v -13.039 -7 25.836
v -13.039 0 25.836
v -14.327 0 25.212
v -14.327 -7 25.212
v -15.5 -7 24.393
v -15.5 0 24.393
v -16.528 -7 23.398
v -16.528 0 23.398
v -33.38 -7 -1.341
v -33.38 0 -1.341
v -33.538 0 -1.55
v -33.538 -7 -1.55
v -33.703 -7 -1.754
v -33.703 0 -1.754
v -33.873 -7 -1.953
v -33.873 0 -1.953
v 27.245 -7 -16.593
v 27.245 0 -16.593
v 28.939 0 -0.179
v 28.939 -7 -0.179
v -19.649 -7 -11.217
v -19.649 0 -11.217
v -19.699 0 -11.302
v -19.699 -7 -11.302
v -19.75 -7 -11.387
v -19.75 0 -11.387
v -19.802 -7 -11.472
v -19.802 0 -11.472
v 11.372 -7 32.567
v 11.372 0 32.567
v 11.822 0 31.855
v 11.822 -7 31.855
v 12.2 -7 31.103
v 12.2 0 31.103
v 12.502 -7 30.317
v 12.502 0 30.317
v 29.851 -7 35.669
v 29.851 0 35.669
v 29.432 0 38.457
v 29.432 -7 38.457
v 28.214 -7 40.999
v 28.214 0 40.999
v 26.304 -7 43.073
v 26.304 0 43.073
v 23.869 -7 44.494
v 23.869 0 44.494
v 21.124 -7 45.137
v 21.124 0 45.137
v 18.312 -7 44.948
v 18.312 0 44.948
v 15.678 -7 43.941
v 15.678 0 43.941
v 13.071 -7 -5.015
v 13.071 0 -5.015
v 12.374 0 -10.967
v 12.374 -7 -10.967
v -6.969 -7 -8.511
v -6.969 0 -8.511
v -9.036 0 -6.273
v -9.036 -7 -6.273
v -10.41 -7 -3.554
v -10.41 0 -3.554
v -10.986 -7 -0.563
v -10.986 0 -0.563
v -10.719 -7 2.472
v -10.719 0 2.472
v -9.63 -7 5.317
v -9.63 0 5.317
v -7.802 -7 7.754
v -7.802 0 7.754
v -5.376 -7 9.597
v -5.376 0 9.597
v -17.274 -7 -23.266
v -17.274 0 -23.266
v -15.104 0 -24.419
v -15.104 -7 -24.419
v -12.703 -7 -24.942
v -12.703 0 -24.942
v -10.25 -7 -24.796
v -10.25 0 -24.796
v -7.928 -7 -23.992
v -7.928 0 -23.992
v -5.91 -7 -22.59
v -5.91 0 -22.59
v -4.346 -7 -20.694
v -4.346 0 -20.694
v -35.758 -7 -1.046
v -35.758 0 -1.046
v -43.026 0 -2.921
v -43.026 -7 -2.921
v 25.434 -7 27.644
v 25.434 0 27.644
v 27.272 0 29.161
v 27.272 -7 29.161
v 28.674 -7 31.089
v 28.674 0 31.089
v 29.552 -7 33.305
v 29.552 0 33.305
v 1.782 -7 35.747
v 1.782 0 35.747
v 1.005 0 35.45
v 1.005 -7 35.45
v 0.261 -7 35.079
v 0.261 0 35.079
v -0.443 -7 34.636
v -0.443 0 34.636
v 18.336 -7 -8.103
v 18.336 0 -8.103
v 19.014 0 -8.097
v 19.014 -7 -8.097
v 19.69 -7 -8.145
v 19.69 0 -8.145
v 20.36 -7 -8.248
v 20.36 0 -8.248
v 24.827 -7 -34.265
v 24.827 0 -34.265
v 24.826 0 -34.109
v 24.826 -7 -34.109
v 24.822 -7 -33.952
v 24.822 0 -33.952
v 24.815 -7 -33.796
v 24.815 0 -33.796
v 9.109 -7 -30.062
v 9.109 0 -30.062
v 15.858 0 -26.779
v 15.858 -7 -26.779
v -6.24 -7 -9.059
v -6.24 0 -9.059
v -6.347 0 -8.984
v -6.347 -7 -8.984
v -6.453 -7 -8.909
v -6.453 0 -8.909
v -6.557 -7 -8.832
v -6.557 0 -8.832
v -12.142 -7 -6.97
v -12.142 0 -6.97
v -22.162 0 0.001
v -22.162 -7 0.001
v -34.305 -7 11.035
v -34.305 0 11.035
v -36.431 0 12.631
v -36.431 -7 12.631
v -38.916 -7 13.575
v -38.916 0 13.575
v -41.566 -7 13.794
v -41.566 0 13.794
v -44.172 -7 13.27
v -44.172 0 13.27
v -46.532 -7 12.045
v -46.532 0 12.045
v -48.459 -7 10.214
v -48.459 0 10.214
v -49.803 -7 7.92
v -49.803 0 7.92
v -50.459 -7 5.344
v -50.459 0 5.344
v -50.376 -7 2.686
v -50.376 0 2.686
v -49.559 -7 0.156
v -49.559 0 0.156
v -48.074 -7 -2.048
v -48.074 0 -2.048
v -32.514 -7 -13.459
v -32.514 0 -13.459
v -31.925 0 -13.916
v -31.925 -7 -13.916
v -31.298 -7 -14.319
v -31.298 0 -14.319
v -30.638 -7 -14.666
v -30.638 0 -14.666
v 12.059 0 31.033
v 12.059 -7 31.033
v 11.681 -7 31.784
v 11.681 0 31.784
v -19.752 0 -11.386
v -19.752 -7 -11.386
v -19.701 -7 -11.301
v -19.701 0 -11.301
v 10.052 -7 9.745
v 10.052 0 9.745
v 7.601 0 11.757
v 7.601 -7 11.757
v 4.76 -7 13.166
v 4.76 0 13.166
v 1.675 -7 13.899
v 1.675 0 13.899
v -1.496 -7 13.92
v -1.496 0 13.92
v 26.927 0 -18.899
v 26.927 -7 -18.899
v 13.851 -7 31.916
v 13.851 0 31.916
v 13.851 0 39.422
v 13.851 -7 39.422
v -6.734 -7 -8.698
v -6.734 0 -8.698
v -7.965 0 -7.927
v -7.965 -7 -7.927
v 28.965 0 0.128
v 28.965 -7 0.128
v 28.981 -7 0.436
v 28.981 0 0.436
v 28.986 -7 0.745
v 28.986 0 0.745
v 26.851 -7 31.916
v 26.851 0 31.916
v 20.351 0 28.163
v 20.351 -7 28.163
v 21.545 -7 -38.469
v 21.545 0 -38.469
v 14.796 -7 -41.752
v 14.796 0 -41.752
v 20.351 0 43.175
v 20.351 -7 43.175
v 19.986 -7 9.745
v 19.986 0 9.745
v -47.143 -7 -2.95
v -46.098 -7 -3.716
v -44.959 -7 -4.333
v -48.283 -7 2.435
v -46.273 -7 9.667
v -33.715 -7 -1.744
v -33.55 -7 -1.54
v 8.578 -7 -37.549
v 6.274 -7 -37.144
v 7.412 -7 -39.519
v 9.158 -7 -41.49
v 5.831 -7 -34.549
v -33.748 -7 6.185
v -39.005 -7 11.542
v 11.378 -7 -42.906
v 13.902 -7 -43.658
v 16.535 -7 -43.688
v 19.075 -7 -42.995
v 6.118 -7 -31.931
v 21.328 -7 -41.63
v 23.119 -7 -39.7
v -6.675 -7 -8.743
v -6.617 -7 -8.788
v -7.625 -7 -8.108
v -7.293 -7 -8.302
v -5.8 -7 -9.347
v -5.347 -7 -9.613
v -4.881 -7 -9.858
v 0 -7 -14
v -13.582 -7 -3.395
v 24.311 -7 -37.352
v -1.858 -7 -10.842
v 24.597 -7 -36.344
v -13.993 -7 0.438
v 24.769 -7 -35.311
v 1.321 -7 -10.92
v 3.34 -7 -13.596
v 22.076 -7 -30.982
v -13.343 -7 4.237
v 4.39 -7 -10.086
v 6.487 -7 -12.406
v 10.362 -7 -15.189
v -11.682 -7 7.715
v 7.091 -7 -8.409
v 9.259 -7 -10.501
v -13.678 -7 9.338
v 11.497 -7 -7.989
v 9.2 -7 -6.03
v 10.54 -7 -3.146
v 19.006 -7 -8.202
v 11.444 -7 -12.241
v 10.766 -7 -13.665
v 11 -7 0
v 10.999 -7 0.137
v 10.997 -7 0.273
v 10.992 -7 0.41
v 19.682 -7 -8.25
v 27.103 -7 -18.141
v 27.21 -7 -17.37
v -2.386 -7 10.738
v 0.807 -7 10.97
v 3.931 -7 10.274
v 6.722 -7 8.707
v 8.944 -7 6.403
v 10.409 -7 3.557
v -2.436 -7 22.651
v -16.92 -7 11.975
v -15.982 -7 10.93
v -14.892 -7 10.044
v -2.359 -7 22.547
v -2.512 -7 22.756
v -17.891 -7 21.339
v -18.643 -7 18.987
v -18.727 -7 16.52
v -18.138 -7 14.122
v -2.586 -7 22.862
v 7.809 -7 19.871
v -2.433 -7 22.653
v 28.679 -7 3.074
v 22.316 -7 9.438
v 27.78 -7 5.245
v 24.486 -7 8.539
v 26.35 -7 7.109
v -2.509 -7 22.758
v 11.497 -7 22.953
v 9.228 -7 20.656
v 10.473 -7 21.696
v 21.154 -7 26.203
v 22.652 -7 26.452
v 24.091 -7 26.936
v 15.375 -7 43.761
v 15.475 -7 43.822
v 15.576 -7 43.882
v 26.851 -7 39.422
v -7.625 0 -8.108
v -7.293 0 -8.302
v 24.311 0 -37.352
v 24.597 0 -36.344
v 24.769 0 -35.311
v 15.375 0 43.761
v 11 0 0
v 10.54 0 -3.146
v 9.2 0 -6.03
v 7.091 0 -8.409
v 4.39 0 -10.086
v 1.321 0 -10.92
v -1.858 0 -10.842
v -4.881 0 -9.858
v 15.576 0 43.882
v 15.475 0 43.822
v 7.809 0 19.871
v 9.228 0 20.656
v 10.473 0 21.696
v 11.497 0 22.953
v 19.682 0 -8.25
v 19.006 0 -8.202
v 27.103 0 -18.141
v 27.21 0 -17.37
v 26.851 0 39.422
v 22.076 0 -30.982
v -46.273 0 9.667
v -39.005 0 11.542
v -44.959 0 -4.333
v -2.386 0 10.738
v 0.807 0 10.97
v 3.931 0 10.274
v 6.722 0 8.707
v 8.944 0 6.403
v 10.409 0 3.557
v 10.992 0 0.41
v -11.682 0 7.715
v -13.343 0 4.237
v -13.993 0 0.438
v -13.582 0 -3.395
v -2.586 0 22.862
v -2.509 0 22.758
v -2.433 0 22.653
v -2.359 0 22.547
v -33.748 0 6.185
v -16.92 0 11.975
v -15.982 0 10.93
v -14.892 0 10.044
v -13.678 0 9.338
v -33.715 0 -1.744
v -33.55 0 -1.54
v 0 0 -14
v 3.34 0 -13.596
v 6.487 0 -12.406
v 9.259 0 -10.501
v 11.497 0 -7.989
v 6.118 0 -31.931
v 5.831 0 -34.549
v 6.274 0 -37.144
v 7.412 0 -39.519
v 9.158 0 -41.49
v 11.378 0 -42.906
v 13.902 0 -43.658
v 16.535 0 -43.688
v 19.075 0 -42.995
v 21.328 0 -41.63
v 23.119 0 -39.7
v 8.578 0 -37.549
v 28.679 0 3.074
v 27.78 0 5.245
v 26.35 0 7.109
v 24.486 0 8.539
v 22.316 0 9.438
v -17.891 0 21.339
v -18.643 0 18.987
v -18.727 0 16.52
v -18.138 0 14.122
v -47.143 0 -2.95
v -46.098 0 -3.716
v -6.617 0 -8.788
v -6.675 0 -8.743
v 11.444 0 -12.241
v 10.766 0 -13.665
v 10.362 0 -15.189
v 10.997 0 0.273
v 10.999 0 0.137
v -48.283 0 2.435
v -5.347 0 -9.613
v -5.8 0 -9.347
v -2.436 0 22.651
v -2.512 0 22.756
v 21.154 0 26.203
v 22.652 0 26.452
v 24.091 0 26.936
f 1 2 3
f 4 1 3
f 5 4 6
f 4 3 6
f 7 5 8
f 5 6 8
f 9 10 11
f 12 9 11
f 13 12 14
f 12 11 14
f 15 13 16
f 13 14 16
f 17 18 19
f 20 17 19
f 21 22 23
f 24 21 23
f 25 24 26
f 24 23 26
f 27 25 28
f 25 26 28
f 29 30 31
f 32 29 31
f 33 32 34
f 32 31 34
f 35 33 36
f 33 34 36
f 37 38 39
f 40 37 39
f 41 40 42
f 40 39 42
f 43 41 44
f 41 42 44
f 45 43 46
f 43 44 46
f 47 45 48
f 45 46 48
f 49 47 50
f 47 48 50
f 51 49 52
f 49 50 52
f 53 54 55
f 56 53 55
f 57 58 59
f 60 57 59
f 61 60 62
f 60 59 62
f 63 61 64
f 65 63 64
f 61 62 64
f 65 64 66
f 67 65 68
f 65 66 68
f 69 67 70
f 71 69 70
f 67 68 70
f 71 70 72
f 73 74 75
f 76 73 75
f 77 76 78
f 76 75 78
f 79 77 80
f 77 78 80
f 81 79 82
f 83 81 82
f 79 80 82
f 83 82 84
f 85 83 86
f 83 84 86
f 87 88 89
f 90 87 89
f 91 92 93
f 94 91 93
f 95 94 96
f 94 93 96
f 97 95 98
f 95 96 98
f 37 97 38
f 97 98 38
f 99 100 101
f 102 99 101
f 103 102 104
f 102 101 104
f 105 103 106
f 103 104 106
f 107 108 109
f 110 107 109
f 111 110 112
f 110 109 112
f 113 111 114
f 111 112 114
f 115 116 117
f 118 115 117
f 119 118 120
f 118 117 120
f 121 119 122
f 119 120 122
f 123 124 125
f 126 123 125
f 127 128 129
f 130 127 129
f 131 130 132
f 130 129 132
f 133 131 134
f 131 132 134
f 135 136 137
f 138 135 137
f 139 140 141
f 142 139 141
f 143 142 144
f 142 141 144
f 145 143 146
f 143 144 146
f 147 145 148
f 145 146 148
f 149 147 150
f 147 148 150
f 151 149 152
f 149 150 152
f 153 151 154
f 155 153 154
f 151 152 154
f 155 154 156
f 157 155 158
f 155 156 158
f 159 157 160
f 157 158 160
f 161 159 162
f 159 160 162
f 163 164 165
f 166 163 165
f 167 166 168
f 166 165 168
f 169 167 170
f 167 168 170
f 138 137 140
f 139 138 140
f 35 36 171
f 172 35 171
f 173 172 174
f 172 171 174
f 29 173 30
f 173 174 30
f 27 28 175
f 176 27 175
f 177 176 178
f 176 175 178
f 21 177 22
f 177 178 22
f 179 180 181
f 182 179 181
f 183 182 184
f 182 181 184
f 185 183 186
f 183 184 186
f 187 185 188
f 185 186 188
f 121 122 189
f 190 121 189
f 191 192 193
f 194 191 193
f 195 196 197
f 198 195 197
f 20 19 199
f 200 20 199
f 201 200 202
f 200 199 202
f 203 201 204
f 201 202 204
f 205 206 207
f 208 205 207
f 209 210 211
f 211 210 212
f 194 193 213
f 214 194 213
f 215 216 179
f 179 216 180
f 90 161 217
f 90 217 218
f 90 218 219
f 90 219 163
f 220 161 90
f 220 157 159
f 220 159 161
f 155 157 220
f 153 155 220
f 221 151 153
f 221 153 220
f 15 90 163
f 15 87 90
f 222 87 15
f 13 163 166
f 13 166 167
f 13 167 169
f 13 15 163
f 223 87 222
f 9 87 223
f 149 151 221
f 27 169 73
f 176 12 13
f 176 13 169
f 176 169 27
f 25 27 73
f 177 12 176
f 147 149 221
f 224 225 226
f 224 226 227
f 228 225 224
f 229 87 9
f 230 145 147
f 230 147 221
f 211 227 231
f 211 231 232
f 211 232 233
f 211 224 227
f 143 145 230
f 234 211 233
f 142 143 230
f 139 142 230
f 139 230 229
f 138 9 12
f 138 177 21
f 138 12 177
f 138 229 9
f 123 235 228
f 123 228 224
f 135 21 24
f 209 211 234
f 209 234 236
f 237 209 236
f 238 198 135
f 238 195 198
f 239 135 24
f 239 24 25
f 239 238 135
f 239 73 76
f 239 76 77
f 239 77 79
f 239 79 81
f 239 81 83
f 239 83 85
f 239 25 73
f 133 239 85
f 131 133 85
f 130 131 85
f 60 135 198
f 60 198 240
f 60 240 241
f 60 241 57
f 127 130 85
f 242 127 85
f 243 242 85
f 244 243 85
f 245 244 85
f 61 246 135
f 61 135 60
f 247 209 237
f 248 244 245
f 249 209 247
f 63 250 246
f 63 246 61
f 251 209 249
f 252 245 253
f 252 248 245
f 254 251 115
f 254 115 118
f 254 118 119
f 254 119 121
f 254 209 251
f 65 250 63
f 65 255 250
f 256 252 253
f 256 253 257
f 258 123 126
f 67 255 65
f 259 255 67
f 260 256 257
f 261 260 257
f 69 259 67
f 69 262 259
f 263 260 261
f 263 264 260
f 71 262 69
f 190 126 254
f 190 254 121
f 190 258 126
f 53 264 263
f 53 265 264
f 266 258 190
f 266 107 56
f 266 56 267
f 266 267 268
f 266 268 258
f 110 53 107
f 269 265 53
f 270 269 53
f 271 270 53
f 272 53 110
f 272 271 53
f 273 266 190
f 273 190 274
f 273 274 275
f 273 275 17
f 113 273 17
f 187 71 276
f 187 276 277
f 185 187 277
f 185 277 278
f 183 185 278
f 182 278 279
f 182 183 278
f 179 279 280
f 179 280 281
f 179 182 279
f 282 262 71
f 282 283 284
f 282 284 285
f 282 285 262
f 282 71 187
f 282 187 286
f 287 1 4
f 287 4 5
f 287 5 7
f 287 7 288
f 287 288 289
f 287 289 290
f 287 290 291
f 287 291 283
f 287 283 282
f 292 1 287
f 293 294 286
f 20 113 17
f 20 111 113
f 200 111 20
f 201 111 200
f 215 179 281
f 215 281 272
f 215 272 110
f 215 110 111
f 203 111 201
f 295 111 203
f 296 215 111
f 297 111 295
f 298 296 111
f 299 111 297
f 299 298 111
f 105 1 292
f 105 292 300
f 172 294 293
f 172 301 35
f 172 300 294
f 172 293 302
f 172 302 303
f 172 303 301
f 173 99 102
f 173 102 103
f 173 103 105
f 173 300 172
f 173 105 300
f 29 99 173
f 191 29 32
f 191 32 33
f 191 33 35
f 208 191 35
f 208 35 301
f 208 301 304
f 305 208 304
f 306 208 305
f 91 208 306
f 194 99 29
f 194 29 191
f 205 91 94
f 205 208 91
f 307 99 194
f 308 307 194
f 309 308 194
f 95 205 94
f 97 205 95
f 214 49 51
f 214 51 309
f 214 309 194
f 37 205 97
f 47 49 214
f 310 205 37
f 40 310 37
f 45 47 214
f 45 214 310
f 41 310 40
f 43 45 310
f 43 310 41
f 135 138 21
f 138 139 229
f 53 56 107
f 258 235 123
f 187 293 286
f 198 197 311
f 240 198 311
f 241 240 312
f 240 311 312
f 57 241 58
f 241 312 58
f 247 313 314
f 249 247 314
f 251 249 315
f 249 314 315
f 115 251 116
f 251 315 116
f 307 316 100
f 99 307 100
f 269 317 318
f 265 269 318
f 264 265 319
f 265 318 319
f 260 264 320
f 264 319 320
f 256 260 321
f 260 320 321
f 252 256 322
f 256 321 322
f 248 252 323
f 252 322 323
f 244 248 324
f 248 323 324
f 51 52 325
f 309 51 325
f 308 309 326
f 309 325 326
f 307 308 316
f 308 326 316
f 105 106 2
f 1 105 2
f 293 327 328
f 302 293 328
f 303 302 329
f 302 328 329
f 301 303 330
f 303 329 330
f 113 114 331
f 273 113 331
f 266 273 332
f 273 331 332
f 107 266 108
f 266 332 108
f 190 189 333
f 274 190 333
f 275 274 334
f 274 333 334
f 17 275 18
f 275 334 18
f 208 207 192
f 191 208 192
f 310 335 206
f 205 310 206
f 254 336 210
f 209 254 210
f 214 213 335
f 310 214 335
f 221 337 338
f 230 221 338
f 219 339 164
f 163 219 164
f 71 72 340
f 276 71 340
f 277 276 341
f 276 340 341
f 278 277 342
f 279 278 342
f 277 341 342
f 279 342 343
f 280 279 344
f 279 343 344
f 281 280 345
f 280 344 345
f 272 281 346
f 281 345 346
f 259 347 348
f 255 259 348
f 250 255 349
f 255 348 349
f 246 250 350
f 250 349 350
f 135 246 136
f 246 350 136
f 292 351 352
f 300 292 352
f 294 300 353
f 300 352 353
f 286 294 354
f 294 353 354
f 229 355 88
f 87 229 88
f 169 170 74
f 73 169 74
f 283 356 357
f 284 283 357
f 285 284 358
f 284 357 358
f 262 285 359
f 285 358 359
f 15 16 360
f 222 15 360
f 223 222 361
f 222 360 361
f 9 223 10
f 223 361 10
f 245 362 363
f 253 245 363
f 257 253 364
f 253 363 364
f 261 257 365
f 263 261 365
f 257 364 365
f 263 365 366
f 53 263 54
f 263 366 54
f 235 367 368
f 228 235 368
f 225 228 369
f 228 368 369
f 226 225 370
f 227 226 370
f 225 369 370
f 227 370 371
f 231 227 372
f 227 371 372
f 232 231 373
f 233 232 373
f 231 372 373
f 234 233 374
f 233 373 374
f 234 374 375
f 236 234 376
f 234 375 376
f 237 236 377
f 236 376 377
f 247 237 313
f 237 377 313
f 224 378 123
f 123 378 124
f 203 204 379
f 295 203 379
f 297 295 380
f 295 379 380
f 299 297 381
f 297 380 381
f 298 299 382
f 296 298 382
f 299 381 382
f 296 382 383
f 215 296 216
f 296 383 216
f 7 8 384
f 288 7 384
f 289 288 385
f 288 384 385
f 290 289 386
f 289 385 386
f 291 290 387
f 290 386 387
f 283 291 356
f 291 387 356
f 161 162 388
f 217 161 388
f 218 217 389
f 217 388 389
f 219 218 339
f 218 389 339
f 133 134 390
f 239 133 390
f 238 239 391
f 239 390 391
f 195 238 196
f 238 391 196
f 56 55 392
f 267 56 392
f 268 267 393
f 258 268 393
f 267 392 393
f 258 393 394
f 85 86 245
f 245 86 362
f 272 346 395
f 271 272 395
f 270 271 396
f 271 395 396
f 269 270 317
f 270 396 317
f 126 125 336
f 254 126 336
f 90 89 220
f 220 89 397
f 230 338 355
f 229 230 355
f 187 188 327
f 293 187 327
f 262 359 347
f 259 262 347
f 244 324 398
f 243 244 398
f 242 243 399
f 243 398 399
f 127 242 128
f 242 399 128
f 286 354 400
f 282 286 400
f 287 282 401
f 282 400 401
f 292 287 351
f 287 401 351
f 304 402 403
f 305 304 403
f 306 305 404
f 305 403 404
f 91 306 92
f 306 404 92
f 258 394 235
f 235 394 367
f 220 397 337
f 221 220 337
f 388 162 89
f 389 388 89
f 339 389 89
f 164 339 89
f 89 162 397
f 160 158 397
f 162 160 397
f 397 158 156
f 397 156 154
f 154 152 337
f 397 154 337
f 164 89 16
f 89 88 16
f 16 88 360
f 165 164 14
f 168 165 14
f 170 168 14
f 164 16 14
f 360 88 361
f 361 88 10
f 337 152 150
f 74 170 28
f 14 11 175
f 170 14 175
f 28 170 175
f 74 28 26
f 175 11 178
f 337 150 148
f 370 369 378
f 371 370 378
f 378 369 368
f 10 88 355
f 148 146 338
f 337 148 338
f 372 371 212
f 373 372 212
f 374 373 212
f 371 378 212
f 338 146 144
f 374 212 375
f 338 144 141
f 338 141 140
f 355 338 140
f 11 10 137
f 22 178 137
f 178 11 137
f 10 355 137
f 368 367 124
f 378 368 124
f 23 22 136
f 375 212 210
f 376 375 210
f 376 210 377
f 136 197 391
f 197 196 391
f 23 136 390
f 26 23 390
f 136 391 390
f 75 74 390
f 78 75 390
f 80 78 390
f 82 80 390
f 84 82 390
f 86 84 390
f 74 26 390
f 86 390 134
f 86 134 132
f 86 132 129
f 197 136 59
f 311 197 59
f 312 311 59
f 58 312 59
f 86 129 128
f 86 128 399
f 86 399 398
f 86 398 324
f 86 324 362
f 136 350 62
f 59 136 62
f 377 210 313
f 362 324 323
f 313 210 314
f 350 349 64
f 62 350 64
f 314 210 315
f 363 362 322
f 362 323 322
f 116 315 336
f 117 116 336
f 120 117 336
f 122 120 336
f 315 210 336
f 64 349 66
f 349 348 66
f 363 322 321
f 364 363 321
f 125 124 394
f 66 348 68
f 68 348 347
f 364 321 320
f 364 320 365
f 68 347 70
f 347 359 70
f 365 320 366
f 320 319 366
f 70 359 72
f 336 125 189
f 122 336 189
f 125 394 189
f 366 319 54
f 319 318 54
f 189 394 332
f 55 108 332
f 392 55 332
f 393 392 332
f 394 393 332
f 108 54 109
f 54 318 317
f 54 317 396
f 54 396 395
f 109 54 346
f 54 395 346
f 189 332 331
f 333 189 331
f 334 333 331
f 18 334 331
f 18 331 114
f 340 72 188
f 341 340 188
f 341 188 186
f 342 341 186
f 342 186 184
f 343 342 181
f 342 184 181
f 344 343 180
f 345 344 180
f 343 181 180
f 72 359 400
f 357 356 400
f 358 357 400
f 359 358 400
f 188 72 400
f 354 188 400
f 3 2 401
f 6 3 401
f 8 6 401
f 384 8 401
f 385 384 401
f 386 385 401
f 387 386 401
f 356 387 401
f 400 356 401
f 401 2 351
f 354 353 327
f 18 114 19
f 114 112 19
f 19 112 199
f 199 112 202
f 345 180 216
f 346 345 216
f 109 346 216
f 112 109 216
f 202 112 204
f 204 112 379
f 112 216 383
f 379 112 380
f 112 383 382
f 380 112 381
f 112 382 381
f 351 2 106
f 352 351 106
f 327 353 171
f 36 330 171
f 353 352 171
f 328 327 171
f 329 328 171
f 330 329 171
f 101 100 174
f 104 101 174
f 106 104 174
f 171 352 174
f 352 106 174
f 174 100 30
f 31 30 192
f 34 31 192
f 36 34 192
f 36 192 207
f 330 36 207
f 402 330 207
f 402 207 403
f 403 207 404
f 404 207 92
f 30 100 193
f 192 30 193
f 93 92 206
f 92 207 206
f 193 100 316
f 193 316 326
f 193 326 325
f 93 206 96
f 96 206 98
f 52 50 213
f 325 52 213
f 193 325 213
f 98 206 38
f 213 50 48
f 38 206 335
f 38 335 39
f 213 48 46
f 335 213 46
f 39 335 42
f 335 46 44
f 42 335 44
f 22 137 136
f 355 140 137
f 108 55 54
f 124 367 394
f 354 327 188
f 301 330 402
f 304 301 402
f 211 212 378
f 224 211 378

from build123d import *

# Parameters (mm, degrees)
F1_DEPTH = 7


with BuildPart() as f1:
    # F0 (on Front) → F1 (new body)
    with BuildSketch(Plane.XZ):
        with BuildLine():
            ThreePointArc((11, 0), (5.8012105465, -9.3459058521), (-4.8810829447, -9.8577395628))
            ThreePointArc((-4.8810829447, -9.8577395628), (-5.5749329735, -9.4826221237), (-6.2401185881, -9.0587482582))
            ThreePointArc((-6.2401185881, -9.0587482582), (-4.4334688175, -11.105495634), (-3.3236127951, -13.5997646299))
            ThreePointArc((-3.3236127951, -13.5997646299), (-1.6738122926, -13.8995810156), (0, -14))
            ThreePointArc((0, -14), (7.9304668623, -11.5372308352), (13.0708038317, -5.0153850494))
            ThreePointArc((13.0708038317, -5.0153850494), (11.5818296218, -2.4752215759), (10.9923725134, 0.4095687088))
            ThreePointArc((10.9923725134, 0.4095687088), (10.998092963, 0.2048198634), (11, 0))
        make_face()
        with BuildLine():
            ThreePointArc((-5.376474925, 9.5965367389), (5.3837414339, 9.5924620496), (10.9923725134, 0.4095687088))
            ThreePointArc((10.9923725134, 0.4095687088), (11.3655224252, 3.3302251077), (12.6613409157, 5.9741481582))
            ThreePointArc((12.6613409157, 5.9741481582), (11.5120561281, 7.9669670329), (10.0519351006, 9.7446703758))
            ThreePointArc((10.0519351006, 9.7446703758), (4.7602009643, 13.1658834409), (-1.4958903607, 13.9198531612))
            ThreePointArc((-1.4958903607, 13.9198531612), (-3.0777558878, 11.4364731057), (-5.376474925, 9.5965367389))
        make_face()
        with BuildLine():
            ThreePointArc((12.6613409157, 5.9741481582), (11.3655224252, 3.3302251077), (10.9923725134, 0.4095687088))
            ThreePointArc((10.9923725134, 0.4095687088), (11.5818296218, -2.4752215759), (13.0708038317, -5.0153850494))
            ThreePointArc((13.0708038317, -5.0153850494), (13.765741056, -2.5503672634), (14, 0))
            ThreePointArc((14, 0), (13.6612366355, 3.0611457969), (12.6613409157, 5.9741481582))
        make_face()
        with BuildLine():
            Line((-8.3457962775, -11.2404485895), (-6.5574113609, -8.8317810346))
            ThreePointArc((-6.5574113609, -8.8317810346), (-6.6459743499, -8.7653308517), (-6.7338640067, -8.6979926155))
            Line((-6.7338640067, -8.6979926155), (-7.9648038145, -7.9274867454))
            ThreePointArc((-7.9648038145, -7.9274867454), (-9.9953714425, -7.1966013967), (-12.1415555616, -6.9701239979))
            ThreePointArc((-12.1415555616, -6.9701239979), (-10.4638336366, -9.3009776704), (-8.3457962775, -11.2404485895))
        make_face()
        with BuildLine():
            ThreePointArc((-3.0061369382, -15.9691051511), (-3.0858589916, -14.7738472893), (-3.3236127951, -13.5997646299))
            ThreePointArc((-3.3236127951, -13.5997646299), (-5.95276155, -12.6714099424), (-8.3457962775, -11.2404485895))
            Line((-8.3457962775, -11.2404485895), (-17.2744989499, -23.2659785715))
            ThreePointArc((-17.2744989499, -23.2659785715), (-10.2503324106, -24.7961743397), (-4.3464215016, -20.6944368252))
            ThreePointArc((-4.3464215016, -20.6944368252), (-3.3476890712, -18.424971706), (-3.0061369382, -15.9691051511))
        make_face()
        with BuildLine():
            ThreePointArc((0, -14), (-1.6738122926, -13.8995810156), (-3.3236127951, -13.5997646299))
            ThreePointArc((-3.3236127951, -13.5997646299), (-3.0858589916, -14.7738472893), (-3.0061369382, -15.9691051511))
            ThreePointArc((-3.0061369382, -15.9691051511), (-3.3476890712, -18.424971706), (-4.3464215016, -20.6944368252))
            Line((-4.3464215016, -20.6944368252), (0, -14))
        make_face()
        with BuildLine():
            ThreePointArc((-6.969159713, -8.5106294065), (-10.9576931928, 0.9638256544), (-5.376474925, 9.5965367389))
            ThreePointArc((-5.376474925, 9.5965367389), (-8.1460141659, 8.5969734972), (-11.0899483994, 8.5447670828))
            ThreePointArc((-11.0899483994, 8.5447670828), (-11.3936737324, 8.1353671632), (-11.6822932995, 7.71518135))
            ThreePointArc((-11.6822932995, 7.71518135), (-13.9931587545, 0.4376163512), (-12.1415555616, -6.9701239979))
            ThreePointArc((-12.1415555616, -6.9701239979), (-9.9953714425, -7.1966013967), (-7.9648038145, -7.9274867454))
            ThreePointArc((-7.9648038145, -7.9274867454), (-7.4576269032, -8.2030858065), (-6.969159713, -8.5106294065))
        make_face()
        with BuildLine():
            ThreePointArc((-11.0899483994, 8.5447670828), (-8.1460141659, 8.5969734972), (-5.376474925, 9.5965367389))
            ThreePointArc((-5.376474925, 9.5965367389), (-3.0777558878, 11.4364731057), (-1.4958903607, 13.9198531612))
            ThreePointArc((-1.4958903607, 13.9198531612), (-6.842786122, 12.2137741132), (-11.0899483994, 8.5447670828))
        make_face()
        with BuildLine():
            ThreePointArc((19.9861318426, 9.7446703758), (15.8669875166, 8.7467107419), (12.6613409157, 5.9741481582))
            ThreePointArc((12.6613409157, 5.9741481582), (13.6612366355, 3.0611457969), (14, 0))
            ThreePointArc((14, 0), (13.765741056, -2.5503672634), (13.0708038317, -5.0153850494))
            ThreePointArc((13.0708038317, -5.0153850494), (15.4336529722, -7.0190230838), (18.3359214805, -8.1027476521))
            ThreePointArc((18.3359214805, -8.1027476521), (19.3521423539, -8.1145601259), (20.3596897588, -8.2475737537))
            ThreePointArc((20.3596897588, -8.2475737537), (26.1521628551, -5.8112476799), (28.9386250903, -0.1788363383))
            ThreePointArc((28.9386250903, -0.1788363383), (28.9742473078, 0.2823064654), (28.9861318426, 0.7446703758))
            ThreePointArc((28.9861318426, 0.7446703758), (26.3500928733, 7.1086314065), (19.9861318426, 9.7446703758))
        make_face()
        with BuildLine():
            ThreePointArc((10.0519351006, 9.7446703758), (11.5120561281, 7.9669670329), (12.6613409157, 5.9741481582))
            ThreePointArc((12.6613409157, 5.9741481582), (15.8669875166, 8.7467107419), (19.9861318426, 9.7446703758))
            Line((19.9861318426, 9.7446703758), (10.0519351006, 9.7446703758))
        make_face()
        with BuildLine():
            ThreePointArc((18.3359214805, -8.1027476521), (15.4336529722, -7.0190230838), (13.0708038317, -5.0153850494))
            Line((13.0708038317, -5.0153850494), (12.3737412803, -10.9668838503))
            ThreePointArc((12.3737412803, -10.9668838503), (15.0648066133, -8.9310805222), (18.3359214805, -8.1027476521))
        make_face()
        with BuildLine():
            Line((-17.2744989499, -23.2659785715), (-8.3457962775, -11.2404485895))
            ThreePointArc((-8.3457962775, -11.2404485895), (-10.4638336366, -9.3009776704), (-12.1415555616, -6.9701239979))
            ThreePointArc((-12.1415555616, -6.9701239979), (-16.43715736, -8.1354560639), (-19.649063201, -11.216665973))
            ThreePointArc((-19.649063201, -11.216665973), (-19.724391136, -11.344928916), (-19.8019520078, -11.4718540574))
            ThreePointArc((-19.8019520078, -11.4718540574), (-20.8063371613, -17.854967297), (-17.2744989499, -23.2659785715))
        make_face()
        with BuildLine():
            ThreePointArc((-13.6781476127, 9.3384627103), (-12.4140612385, 8.8437433423), (-11.0899483994, 8.5447670828))
            ThreePointArc((-11.0899483994, 8.5447670828), (-6.842786122, 12.2137741132), (-1.4958903607, 13.9198531612))
            ThreePointArc((-1.4958903607, 13.9198531612), (-0.9573685591, 15.6476468151), (-0.7754087457, 17.4482487332))
            ThreePointArc((-0.7754087457, 17.4482487332), (-1.1803946677, 20.1176555958), (-2.3589049675, 22.5468241919))
            ThreePointArc((-2.3589049675, 22.5468241919), (-2.4740751428, 22.7030547607), (-2.5856480794, 22.86187428))
            ThreePointArc((-2.5856480794, 22.86187428), (-7.3129464625, 26.1048230847), (-13.0393377511, 25.8355467157))
            Line((-13.0393377511, 25.8355467157), (-16.5283472399, 23.3978555852))
            ThreePointArc((-16.5283472399, 23.3978555852), (-18.7701232631, 17.7566490427), (-16.9199958862, 11.9751440757))
            Line((-16.9199958862, 11.9751440757), (-13.6781476127, 9.3384627103))
        make_face()
        with BuildLine():
            ThreePointArc((-11.6822932995, 7.71518135), (-11.3936737324, 8.1353671632), (-11.0899483994, 8.5447670828))
            ThreePointArc((-11.0899483994, 8.5447670828), (-12.4140612385, 8.8437433423), (-13.6781476127, 9.3384627103))
            Line((-13.6781476127, 9.3384627103), (-11.6822932995, 7.71518135))
        make_face()
        with BuildLine():
            ThreePointArc((-0.7754087457, 17.4482487332), (-0.9573685591, 15.6476468151), (-1.4958903607, 13.9198531612))
            Line((-1.4958903607, 13.9198531612), (7.8085448357, 19.8707942581))
            ThreePointArc((7.8085448357, 19.8707942581), (2.2614474815, 19.4482473971), (-2.3589049675, 22.5468241919))
            ThreePointArc((-2.3589049675, 22.5468241919), (-1.1803946677, 20.1176555958), (-0.7754087457, 17.4482487332))
        make_face()
        with BuildLine():
            ThreePointArc((20.3596897588, -8.2475737537), (19.3437114064, -8.2323723435), (18.3359214805, -8.1027476521))
            ThreePointArc((18.3359214805, -8.1027476521), (15.0648066133, -8.9310805222), (12.3737412803, -10.9668838503))
            ThreePointArc((12.3737412803, -10.9668838503), (11.0717790846, -12.9370118992), (10.3620949656, -15.1893126205))
            ThreePointArc((10.3620949656, -15.1893126205), (11.7634284882, -21.4407548005), (17.1311340372, -24.9381827286))
            ThreePointArc((17.1311340372, -24.9381827286), (23.2062007851, -23.828302418), (26.9265717457, -18.8990925208))
            ThreePointArc((26.9265717457, -18.8990925208), (27.1653245998, -17.7569533476), (27.2454119419, -16.5928782496))
            ThreePointArc((27.2454119419, -16.5928782496), (25.3017585405, -11.1832276806), (20.3596897588, -8.2475737537))
        make_face()
        with BuildLine():
            ThreePointArc((-19.649063201, -11.216665973), (-16.43715736, -8.1354560639), (-12.1415555616, -6.9701239979))
            Line((-12.1415555616, -6.9701239979), (-22.1615028292, 0.0010258267))
            ThreePointArc((-22.1615028292, 0.0010258267), (-19.4822323923, -3.0402070119), (-18.5159037303, -6.9764229829))
            ThreePointArc((-18.5159037303, -6.9764229829), (-18.804078583, -9.1709451975), (-19.649063201, -11.216665973))
        make_face()
        with BuildLine():
            Line((-30.6383680452, -14.6658801996), (-17.2744989499, -23.2659785715))
            ThreePointArc((-17.2744989499, -23.2659785715), (-20.8063371613, -17.854967297), (-19.8019520078, -11.4718540574))
            ThreePointArc((-19.8019520078, -11.4718540574), (-24.6127503438, -15.1296342399), (-30.6383680452, -14.6658801996))
        make_face()
        with BuildLine():
            ThreePointArc((-16.9199958862, 11.9751440757), (-15.4542180518, 10.4660481585), (-13.6781476127, 9.3384627103))
            Line((-13.6781476127, 9.3384627103), (-16.9199958862, 11.9751440757))
        make_face()
        with BuildLine():
            ThreePointArc((-2.3589049675, 22.5468241919), (2.2614474815, 19.4482473971), (7.8085448357, 19.8707942581))
            ThreePointArc((7.8085448357, 19.8707942581), (9.8754074452, 21.1458572643), (11.4973523143, 22.953342135))
            ThreePointArc((11.4973523143, 22.953342135), (12.5602122095, 25.2051330004), (12.9249318129, 27.6683043037))
            ThreePointArc((12.9249318129, 27.6683043037), (12.8184271648, 29.0096602515), (12.501582218, 30.3174019302))
            ThreePointArc((12.501582218, 30.3174019302), (11.8618032949, 31.4043947248), (11.3716628248, 32.5665619785))
            ThreePointArc((11.3716628248, 32.5665619785), (7.1006656903, 35.7361694623), (1.7820464101, 35.7469896391))
            ThreePointArc((1.7820464101, 35.7469896391), (0.6285157486, 35.2733832031), (-0.4433099416, 34.6361032546))
            ThreePointArc((-0.4433099416, 34.6361032546), (-3.9377661917, 29.1899094049), (-2.5856480794, 22.86187428))
            ThreePointArc((-2.5856480794, 22.86187428), (-2.4705778514, 22.7055717787), (-2.3589049675, 22.5468241919))
        make_face()
        with BuildLine():
            ThreePointArc((28.9386250903, -0.1788363383), (26.1521628551, -5.8112476799), (20.3596897588, -8.2475737537))
            ThreePointArc((20.3596897588, -8.2475737537), (25.3017585405, -11.1832276806), (27.2454119419, -16.5928782496))
            Line((27.2454119419, -16.5928782496), (28.9386250903, -0.1788363383))
        make_face()
        with BuildLine():
            ThreePointArc((17.1311340372, -24.9381827286), (11.7634284882, -21.4407548005), (10.3620949656, -15.1893126205))
            Line((10.3620949656, -15.1893126205), (6.1182063209, -31.9309354787))
            ThreePointArc((6.1182063209, -31.9309354787), (10.2346471912, -26.2454036686), (17.1311340372, -24.9381827286))
        make_face()
        with BuildLine():
            ThreePointArc((-19.8019520078, -11.4718540574), (-19.726562038, -11.3436282808), (-19.649063201, -11.216665973))
            ThreePointArc((-19.649063201, -11.216665973), (-18.804078583, -9.1709451975), (-18.5159037303, -6.9764229829))
            ThreePointArc((-18.5159037303, -6.9764229829), (-19.4822323923, -3.0402070119), (-22.1615028292, 0.0010258267))
            ThreePointArc((-22.1615028292, 0.0010258267), (-28.0259123715, 1.4633567858), (-33.3796599915, -1.3414778857))
            ThreePointArc((-33.3796599915, -1.3414778857), (-33.6198058263, -1.6522841582), (-33.8725938013, -1.9528981975))
            ThreePointArc((-33.8725938013, -1.9528981975), (-35.4572347505, -7.9733836681), (-32.5136615696, -13.4590658653))
            Line((-32.5136615696, -13.4590658653), (-30.6383680452, -14.6658801996))
            ThreePointArc((-30.6383680452, -14.6658801996), (-24.6127503438, -15.1296342399), (-19.8019520078, -11.4718540574))
        make_face()
        with BuildLine():
            ThreePointArc((-33.3796599915, -1.3414778857), (-28.0259123715, 1.4633567858), (-22.1615028292, 0.0010258267))
            Line((-22.1615028292, 0.0010258267), (-34.305198064, 11.0349063801))
            ThreePointArc((-34.305198064, 11.0349063801), (-32.2406685601, 7.9504227537), (-31.5155990172, 4.3102860156))
            ThreePointArc((-31.5155990172, 4.3102860156), (-31.9936418918, 1.3346701754), (-33.3796599915, -1.3414778857))
        make_face()
        with BuildLine():
            ThreePointArc((-32.5136615696, -13.4590658653), (-31.6157638635, -14.1242399053), (-30.6383680452, -14.6658801996))
            Line((-30.6383680452, -14.6658801996), (-32.5136615696, -13.4590658653))
        make_face()
        with BuildLine():
            ThreePointArc((12.9249318129, 27.6683043037), (12.5602122095, 25.2051330004), (11.4973523143, 22.953342135))
            Line((11.4973523143, 22.953342135), (21.1537393142, 26.2030323395))
            ThreePointArc((21.1537393142, 26.2030323395), (16.271028485, 27.0896684433), (12.501582218, 30.3174019302))
            ThreePointArc((12.501582218, 30.3174019302), (12.8184271648, 29.0096602515), (12.9249318129, 27.6683043037))
        make_face()
        with BuildLine():
            ThreePointArc((26.9265717457, -18.8990925208), (23.2062007851, -23.828302418), (17.1311340372, -24.9381827286))
            ThreePointArc((17.1311340372, -24.9381827286), (22.5030713208, -28.0400843595), (24.8153529335, -33.7961991646))
            Line((24.8153529335, -33.7961991646), (26.9265717457, -18.8990925208))
        make_face()
        with BuildLine():
            ThreePointArc((24.8153529335, -33.7961991646), (22.5030713208, -28.0400843595), (17.1311340372, -24.9381827286))
            ThreePointArc((17.1311340372, -24.9381827286), (10.2346471912, -26.2454036686), (6.1182063209, -31.9309354787))
            ThreePointArc((6.1182063209, -31.9309354787), (12.6139154346, -43.3696543498), (24.311375158, -37.3523491122))
            Line((24.311375158, -37.3523491122), (24.8153529335, -33.7961991646))
        make_face()
        Polygon((22.0762519958, -30.9819757122), (21.5450282843, -38.4687062871), (14.7957175594, -41.7520183454), (8.577630546, -37.5485998287), (9.1088542574, -30.0618692537), (15.8581649824, -26.7785571955), align=None, mode=Mode.SUBTRACT)
        with BuildLine():
            ThreePointArc((-33.8725938013, -1.9528981975), (-33.6331923749, -1.6414917748), (-33.3796599915, -1.3414778857))
            ThreePointArc((-33.3796599915, -1.3414778857), (-31.9936418918, 1.3346701754), (-31.5155990172, 4.3102860156))
            ThreePointArc((-31.5155990172, 4.3102860156), (-32.2406685601, 7.9504227537), (-34.305198064, 11.0349063801))
            ThreePointArc((-34.305198064, 11.0349063801), (-47.5595492901, 11.1969916739), (-48.0737467156, -2.0483735183))
            Line((-48.0737467156, -2.0483735183), (-44.9586657717, -4.3327588512))
            ThreePointArc((-44.9586657717, -4.3327588512), (-39.021649238, -4.9781026648), (-33.8725938013, -1.9528981975))
        make_face()
        Polygon((-43.0257687757, -2.9210728384), (-48.2832243679, 2.4354646654), (-46.2730546094, 9.6668235194), (-39.0054292586, 11.5416448695), (-33.7479736665, 6.1851073657), (-35.758143425, -1.0462514883), align=None, mode=Mode.SUBTRACT)
        with BuildLine():
            Line((-44.9586657717, -4.3327588512), (-32.5136615696, -13.4590658653))
            ThreePointArc((-32.5136615696, -13.4590658653), (-35.4572347505, -7.9733836681), (-33.8725938013, -1.9528981975))
            ThreePointArc((-33.8725938013, -1.9528981975), (-39.021649238, -4.9781026648), (-44.9586657717, -4.3327588512))
        make_face()
        with BuildLine():
            ThreePointArc((-13.0393377511, 25.8355467157), (-14.9300176676, 24.8259182068), (-16.5283472399, 23.3978555852))
            Line((-16.5283472399, 23.3978555852), (-13.0393377511, 25.8355467157))
        make_face()
        with BuildLine():
            ThreePointArc((-13.0393377511, 25.8355467157), (-7.3129464625, 26.1048230847), (-2.5856480794, 22.86187428))
            ThreePointArc((-2.5856480794, 22.86187428), (-3.9377661917, 29.1899094049), (-0.4433099416, 34.6361032546))
            Line((-0.4433099416, 34.6361032546), (-13.0393377511, 25.8355467157))
        make_face()
        with BuildLine():
            Line((25.4342829671, 27.6435753478), (21.1537393142, 26.2030323395))
            ThreePointArc((21.1537393142, 26.2030323395), (23.3808627584, 26.6652260642), (25.4342829671, 27.6435753478))
        make_face()
        with BuildLine():
            ThreePointArc((12.501582218, 30.3174019302), (16.271028485, 27.0896684433), (21.1537393142, 26.2030323395))
            Line((21.1537393142, 26.2030323395), (25.4342829671, 27.6435753478))
            ThreePointArc((25.4342829671, 27.6435753478), (28.673742402, 31.0888212365), (29.8507853844, 35.6690380962))
            ThreePointArc((29.8507853844, 35.6690380962), (25.1394128473, 43.8738566208), (15.6783544325, 43.9405790046))
            Line((15.6783544325, 43.9405790046), (15.3746215347, 43.7614909593))
            ThreePointArc((15.3746215347, 43.7614909593), (11.405445066, 38.8676138087), (11.3716628248, 32.5665619785))
            ThreePointArc((11.3716628248, 32.5665619785), (12.0203368403, 31.4840378465), (12.501582218, 30.3174019302))
        make_face()
        Polygon((20.3507853844, 28.1634845967), (13.8507853844, 31.9162613465), (13.8507853844, 39.4218148459), (20.3507853844, 43.1745915957), (26.8507853844, 39.4218148459), (26.8507853844, 31.9162613465), align=None, mode=Mode.SUBTRACT)
        with BuildLine():
            ThreePointArc((24.8269412709, -34.2652877704), (24.8240437447, -34.030671909), (24.8153529335, -33.7961991646))
            Line((24.8153529335, -33.7961991646), (24.311375158, -37.3523491122))
            ThreePointArc((24.311375158, -37.3523491122), (24.6971633047, -35.8301964055), (24.8269412709, -34.2652877704))
        make_face()
        with BuildLine():
            Line((-44.9586657717, -4.3327588512), (-48.0737467156, -2.0483735183))
            ThreePointArc((-48.0737467156, -2.0483735183), (-46.6335420524, -3.3505700758), (-44.9586657717, -4.3327588512))
        make_face()
        with BuildLine():
            Line((15.3746215347, 43.7614909593), (1.7820464101, 35.7469896391))
            ThreePointArc((1.7820464101, 35.7469896391), (7.1006656903, 35.7361694623), (11.3716628248, 32.5665619785))
            ThreePointArc((11.3716628248, 32.5665619785), (11.405445066, 38.8676138087), (15.3746215347, 43.7614909593))
        make_face()
        with BuildLine():
            ThreePointArc((15.6783544325, 43.9405790046), (15.5256570397, 43.8524442609), (15.3746215347, 43.7614909593))
            Line((15.3746215347, 43.7614909593), (15.6783544325, 43.9405790046))
        make_face()
        with BuildLine():
            ThreePointArc((-3.3236127951, -13.5997646299), (-4.4334688175, -11.105495634), (-6.2401185881, -9.0587482582))
            ThreePointArc((-6.2401185881, -9.0587482582), (-6.3997712248, -8.9466713514), (-6.5574113609, -8.8317810346))
            Line((-6.5574113609, -8.8317810346), (-8.3457962775, -11.2404485895))
            ThreePointArc((-8.3457962775, -11.2404485895), (-5.95276155, -12.6714099424), (-3.3236127951, -13.5997646299))
        make_face()
    extrude(amount=F1_DEPTH)


solid = f1.part
